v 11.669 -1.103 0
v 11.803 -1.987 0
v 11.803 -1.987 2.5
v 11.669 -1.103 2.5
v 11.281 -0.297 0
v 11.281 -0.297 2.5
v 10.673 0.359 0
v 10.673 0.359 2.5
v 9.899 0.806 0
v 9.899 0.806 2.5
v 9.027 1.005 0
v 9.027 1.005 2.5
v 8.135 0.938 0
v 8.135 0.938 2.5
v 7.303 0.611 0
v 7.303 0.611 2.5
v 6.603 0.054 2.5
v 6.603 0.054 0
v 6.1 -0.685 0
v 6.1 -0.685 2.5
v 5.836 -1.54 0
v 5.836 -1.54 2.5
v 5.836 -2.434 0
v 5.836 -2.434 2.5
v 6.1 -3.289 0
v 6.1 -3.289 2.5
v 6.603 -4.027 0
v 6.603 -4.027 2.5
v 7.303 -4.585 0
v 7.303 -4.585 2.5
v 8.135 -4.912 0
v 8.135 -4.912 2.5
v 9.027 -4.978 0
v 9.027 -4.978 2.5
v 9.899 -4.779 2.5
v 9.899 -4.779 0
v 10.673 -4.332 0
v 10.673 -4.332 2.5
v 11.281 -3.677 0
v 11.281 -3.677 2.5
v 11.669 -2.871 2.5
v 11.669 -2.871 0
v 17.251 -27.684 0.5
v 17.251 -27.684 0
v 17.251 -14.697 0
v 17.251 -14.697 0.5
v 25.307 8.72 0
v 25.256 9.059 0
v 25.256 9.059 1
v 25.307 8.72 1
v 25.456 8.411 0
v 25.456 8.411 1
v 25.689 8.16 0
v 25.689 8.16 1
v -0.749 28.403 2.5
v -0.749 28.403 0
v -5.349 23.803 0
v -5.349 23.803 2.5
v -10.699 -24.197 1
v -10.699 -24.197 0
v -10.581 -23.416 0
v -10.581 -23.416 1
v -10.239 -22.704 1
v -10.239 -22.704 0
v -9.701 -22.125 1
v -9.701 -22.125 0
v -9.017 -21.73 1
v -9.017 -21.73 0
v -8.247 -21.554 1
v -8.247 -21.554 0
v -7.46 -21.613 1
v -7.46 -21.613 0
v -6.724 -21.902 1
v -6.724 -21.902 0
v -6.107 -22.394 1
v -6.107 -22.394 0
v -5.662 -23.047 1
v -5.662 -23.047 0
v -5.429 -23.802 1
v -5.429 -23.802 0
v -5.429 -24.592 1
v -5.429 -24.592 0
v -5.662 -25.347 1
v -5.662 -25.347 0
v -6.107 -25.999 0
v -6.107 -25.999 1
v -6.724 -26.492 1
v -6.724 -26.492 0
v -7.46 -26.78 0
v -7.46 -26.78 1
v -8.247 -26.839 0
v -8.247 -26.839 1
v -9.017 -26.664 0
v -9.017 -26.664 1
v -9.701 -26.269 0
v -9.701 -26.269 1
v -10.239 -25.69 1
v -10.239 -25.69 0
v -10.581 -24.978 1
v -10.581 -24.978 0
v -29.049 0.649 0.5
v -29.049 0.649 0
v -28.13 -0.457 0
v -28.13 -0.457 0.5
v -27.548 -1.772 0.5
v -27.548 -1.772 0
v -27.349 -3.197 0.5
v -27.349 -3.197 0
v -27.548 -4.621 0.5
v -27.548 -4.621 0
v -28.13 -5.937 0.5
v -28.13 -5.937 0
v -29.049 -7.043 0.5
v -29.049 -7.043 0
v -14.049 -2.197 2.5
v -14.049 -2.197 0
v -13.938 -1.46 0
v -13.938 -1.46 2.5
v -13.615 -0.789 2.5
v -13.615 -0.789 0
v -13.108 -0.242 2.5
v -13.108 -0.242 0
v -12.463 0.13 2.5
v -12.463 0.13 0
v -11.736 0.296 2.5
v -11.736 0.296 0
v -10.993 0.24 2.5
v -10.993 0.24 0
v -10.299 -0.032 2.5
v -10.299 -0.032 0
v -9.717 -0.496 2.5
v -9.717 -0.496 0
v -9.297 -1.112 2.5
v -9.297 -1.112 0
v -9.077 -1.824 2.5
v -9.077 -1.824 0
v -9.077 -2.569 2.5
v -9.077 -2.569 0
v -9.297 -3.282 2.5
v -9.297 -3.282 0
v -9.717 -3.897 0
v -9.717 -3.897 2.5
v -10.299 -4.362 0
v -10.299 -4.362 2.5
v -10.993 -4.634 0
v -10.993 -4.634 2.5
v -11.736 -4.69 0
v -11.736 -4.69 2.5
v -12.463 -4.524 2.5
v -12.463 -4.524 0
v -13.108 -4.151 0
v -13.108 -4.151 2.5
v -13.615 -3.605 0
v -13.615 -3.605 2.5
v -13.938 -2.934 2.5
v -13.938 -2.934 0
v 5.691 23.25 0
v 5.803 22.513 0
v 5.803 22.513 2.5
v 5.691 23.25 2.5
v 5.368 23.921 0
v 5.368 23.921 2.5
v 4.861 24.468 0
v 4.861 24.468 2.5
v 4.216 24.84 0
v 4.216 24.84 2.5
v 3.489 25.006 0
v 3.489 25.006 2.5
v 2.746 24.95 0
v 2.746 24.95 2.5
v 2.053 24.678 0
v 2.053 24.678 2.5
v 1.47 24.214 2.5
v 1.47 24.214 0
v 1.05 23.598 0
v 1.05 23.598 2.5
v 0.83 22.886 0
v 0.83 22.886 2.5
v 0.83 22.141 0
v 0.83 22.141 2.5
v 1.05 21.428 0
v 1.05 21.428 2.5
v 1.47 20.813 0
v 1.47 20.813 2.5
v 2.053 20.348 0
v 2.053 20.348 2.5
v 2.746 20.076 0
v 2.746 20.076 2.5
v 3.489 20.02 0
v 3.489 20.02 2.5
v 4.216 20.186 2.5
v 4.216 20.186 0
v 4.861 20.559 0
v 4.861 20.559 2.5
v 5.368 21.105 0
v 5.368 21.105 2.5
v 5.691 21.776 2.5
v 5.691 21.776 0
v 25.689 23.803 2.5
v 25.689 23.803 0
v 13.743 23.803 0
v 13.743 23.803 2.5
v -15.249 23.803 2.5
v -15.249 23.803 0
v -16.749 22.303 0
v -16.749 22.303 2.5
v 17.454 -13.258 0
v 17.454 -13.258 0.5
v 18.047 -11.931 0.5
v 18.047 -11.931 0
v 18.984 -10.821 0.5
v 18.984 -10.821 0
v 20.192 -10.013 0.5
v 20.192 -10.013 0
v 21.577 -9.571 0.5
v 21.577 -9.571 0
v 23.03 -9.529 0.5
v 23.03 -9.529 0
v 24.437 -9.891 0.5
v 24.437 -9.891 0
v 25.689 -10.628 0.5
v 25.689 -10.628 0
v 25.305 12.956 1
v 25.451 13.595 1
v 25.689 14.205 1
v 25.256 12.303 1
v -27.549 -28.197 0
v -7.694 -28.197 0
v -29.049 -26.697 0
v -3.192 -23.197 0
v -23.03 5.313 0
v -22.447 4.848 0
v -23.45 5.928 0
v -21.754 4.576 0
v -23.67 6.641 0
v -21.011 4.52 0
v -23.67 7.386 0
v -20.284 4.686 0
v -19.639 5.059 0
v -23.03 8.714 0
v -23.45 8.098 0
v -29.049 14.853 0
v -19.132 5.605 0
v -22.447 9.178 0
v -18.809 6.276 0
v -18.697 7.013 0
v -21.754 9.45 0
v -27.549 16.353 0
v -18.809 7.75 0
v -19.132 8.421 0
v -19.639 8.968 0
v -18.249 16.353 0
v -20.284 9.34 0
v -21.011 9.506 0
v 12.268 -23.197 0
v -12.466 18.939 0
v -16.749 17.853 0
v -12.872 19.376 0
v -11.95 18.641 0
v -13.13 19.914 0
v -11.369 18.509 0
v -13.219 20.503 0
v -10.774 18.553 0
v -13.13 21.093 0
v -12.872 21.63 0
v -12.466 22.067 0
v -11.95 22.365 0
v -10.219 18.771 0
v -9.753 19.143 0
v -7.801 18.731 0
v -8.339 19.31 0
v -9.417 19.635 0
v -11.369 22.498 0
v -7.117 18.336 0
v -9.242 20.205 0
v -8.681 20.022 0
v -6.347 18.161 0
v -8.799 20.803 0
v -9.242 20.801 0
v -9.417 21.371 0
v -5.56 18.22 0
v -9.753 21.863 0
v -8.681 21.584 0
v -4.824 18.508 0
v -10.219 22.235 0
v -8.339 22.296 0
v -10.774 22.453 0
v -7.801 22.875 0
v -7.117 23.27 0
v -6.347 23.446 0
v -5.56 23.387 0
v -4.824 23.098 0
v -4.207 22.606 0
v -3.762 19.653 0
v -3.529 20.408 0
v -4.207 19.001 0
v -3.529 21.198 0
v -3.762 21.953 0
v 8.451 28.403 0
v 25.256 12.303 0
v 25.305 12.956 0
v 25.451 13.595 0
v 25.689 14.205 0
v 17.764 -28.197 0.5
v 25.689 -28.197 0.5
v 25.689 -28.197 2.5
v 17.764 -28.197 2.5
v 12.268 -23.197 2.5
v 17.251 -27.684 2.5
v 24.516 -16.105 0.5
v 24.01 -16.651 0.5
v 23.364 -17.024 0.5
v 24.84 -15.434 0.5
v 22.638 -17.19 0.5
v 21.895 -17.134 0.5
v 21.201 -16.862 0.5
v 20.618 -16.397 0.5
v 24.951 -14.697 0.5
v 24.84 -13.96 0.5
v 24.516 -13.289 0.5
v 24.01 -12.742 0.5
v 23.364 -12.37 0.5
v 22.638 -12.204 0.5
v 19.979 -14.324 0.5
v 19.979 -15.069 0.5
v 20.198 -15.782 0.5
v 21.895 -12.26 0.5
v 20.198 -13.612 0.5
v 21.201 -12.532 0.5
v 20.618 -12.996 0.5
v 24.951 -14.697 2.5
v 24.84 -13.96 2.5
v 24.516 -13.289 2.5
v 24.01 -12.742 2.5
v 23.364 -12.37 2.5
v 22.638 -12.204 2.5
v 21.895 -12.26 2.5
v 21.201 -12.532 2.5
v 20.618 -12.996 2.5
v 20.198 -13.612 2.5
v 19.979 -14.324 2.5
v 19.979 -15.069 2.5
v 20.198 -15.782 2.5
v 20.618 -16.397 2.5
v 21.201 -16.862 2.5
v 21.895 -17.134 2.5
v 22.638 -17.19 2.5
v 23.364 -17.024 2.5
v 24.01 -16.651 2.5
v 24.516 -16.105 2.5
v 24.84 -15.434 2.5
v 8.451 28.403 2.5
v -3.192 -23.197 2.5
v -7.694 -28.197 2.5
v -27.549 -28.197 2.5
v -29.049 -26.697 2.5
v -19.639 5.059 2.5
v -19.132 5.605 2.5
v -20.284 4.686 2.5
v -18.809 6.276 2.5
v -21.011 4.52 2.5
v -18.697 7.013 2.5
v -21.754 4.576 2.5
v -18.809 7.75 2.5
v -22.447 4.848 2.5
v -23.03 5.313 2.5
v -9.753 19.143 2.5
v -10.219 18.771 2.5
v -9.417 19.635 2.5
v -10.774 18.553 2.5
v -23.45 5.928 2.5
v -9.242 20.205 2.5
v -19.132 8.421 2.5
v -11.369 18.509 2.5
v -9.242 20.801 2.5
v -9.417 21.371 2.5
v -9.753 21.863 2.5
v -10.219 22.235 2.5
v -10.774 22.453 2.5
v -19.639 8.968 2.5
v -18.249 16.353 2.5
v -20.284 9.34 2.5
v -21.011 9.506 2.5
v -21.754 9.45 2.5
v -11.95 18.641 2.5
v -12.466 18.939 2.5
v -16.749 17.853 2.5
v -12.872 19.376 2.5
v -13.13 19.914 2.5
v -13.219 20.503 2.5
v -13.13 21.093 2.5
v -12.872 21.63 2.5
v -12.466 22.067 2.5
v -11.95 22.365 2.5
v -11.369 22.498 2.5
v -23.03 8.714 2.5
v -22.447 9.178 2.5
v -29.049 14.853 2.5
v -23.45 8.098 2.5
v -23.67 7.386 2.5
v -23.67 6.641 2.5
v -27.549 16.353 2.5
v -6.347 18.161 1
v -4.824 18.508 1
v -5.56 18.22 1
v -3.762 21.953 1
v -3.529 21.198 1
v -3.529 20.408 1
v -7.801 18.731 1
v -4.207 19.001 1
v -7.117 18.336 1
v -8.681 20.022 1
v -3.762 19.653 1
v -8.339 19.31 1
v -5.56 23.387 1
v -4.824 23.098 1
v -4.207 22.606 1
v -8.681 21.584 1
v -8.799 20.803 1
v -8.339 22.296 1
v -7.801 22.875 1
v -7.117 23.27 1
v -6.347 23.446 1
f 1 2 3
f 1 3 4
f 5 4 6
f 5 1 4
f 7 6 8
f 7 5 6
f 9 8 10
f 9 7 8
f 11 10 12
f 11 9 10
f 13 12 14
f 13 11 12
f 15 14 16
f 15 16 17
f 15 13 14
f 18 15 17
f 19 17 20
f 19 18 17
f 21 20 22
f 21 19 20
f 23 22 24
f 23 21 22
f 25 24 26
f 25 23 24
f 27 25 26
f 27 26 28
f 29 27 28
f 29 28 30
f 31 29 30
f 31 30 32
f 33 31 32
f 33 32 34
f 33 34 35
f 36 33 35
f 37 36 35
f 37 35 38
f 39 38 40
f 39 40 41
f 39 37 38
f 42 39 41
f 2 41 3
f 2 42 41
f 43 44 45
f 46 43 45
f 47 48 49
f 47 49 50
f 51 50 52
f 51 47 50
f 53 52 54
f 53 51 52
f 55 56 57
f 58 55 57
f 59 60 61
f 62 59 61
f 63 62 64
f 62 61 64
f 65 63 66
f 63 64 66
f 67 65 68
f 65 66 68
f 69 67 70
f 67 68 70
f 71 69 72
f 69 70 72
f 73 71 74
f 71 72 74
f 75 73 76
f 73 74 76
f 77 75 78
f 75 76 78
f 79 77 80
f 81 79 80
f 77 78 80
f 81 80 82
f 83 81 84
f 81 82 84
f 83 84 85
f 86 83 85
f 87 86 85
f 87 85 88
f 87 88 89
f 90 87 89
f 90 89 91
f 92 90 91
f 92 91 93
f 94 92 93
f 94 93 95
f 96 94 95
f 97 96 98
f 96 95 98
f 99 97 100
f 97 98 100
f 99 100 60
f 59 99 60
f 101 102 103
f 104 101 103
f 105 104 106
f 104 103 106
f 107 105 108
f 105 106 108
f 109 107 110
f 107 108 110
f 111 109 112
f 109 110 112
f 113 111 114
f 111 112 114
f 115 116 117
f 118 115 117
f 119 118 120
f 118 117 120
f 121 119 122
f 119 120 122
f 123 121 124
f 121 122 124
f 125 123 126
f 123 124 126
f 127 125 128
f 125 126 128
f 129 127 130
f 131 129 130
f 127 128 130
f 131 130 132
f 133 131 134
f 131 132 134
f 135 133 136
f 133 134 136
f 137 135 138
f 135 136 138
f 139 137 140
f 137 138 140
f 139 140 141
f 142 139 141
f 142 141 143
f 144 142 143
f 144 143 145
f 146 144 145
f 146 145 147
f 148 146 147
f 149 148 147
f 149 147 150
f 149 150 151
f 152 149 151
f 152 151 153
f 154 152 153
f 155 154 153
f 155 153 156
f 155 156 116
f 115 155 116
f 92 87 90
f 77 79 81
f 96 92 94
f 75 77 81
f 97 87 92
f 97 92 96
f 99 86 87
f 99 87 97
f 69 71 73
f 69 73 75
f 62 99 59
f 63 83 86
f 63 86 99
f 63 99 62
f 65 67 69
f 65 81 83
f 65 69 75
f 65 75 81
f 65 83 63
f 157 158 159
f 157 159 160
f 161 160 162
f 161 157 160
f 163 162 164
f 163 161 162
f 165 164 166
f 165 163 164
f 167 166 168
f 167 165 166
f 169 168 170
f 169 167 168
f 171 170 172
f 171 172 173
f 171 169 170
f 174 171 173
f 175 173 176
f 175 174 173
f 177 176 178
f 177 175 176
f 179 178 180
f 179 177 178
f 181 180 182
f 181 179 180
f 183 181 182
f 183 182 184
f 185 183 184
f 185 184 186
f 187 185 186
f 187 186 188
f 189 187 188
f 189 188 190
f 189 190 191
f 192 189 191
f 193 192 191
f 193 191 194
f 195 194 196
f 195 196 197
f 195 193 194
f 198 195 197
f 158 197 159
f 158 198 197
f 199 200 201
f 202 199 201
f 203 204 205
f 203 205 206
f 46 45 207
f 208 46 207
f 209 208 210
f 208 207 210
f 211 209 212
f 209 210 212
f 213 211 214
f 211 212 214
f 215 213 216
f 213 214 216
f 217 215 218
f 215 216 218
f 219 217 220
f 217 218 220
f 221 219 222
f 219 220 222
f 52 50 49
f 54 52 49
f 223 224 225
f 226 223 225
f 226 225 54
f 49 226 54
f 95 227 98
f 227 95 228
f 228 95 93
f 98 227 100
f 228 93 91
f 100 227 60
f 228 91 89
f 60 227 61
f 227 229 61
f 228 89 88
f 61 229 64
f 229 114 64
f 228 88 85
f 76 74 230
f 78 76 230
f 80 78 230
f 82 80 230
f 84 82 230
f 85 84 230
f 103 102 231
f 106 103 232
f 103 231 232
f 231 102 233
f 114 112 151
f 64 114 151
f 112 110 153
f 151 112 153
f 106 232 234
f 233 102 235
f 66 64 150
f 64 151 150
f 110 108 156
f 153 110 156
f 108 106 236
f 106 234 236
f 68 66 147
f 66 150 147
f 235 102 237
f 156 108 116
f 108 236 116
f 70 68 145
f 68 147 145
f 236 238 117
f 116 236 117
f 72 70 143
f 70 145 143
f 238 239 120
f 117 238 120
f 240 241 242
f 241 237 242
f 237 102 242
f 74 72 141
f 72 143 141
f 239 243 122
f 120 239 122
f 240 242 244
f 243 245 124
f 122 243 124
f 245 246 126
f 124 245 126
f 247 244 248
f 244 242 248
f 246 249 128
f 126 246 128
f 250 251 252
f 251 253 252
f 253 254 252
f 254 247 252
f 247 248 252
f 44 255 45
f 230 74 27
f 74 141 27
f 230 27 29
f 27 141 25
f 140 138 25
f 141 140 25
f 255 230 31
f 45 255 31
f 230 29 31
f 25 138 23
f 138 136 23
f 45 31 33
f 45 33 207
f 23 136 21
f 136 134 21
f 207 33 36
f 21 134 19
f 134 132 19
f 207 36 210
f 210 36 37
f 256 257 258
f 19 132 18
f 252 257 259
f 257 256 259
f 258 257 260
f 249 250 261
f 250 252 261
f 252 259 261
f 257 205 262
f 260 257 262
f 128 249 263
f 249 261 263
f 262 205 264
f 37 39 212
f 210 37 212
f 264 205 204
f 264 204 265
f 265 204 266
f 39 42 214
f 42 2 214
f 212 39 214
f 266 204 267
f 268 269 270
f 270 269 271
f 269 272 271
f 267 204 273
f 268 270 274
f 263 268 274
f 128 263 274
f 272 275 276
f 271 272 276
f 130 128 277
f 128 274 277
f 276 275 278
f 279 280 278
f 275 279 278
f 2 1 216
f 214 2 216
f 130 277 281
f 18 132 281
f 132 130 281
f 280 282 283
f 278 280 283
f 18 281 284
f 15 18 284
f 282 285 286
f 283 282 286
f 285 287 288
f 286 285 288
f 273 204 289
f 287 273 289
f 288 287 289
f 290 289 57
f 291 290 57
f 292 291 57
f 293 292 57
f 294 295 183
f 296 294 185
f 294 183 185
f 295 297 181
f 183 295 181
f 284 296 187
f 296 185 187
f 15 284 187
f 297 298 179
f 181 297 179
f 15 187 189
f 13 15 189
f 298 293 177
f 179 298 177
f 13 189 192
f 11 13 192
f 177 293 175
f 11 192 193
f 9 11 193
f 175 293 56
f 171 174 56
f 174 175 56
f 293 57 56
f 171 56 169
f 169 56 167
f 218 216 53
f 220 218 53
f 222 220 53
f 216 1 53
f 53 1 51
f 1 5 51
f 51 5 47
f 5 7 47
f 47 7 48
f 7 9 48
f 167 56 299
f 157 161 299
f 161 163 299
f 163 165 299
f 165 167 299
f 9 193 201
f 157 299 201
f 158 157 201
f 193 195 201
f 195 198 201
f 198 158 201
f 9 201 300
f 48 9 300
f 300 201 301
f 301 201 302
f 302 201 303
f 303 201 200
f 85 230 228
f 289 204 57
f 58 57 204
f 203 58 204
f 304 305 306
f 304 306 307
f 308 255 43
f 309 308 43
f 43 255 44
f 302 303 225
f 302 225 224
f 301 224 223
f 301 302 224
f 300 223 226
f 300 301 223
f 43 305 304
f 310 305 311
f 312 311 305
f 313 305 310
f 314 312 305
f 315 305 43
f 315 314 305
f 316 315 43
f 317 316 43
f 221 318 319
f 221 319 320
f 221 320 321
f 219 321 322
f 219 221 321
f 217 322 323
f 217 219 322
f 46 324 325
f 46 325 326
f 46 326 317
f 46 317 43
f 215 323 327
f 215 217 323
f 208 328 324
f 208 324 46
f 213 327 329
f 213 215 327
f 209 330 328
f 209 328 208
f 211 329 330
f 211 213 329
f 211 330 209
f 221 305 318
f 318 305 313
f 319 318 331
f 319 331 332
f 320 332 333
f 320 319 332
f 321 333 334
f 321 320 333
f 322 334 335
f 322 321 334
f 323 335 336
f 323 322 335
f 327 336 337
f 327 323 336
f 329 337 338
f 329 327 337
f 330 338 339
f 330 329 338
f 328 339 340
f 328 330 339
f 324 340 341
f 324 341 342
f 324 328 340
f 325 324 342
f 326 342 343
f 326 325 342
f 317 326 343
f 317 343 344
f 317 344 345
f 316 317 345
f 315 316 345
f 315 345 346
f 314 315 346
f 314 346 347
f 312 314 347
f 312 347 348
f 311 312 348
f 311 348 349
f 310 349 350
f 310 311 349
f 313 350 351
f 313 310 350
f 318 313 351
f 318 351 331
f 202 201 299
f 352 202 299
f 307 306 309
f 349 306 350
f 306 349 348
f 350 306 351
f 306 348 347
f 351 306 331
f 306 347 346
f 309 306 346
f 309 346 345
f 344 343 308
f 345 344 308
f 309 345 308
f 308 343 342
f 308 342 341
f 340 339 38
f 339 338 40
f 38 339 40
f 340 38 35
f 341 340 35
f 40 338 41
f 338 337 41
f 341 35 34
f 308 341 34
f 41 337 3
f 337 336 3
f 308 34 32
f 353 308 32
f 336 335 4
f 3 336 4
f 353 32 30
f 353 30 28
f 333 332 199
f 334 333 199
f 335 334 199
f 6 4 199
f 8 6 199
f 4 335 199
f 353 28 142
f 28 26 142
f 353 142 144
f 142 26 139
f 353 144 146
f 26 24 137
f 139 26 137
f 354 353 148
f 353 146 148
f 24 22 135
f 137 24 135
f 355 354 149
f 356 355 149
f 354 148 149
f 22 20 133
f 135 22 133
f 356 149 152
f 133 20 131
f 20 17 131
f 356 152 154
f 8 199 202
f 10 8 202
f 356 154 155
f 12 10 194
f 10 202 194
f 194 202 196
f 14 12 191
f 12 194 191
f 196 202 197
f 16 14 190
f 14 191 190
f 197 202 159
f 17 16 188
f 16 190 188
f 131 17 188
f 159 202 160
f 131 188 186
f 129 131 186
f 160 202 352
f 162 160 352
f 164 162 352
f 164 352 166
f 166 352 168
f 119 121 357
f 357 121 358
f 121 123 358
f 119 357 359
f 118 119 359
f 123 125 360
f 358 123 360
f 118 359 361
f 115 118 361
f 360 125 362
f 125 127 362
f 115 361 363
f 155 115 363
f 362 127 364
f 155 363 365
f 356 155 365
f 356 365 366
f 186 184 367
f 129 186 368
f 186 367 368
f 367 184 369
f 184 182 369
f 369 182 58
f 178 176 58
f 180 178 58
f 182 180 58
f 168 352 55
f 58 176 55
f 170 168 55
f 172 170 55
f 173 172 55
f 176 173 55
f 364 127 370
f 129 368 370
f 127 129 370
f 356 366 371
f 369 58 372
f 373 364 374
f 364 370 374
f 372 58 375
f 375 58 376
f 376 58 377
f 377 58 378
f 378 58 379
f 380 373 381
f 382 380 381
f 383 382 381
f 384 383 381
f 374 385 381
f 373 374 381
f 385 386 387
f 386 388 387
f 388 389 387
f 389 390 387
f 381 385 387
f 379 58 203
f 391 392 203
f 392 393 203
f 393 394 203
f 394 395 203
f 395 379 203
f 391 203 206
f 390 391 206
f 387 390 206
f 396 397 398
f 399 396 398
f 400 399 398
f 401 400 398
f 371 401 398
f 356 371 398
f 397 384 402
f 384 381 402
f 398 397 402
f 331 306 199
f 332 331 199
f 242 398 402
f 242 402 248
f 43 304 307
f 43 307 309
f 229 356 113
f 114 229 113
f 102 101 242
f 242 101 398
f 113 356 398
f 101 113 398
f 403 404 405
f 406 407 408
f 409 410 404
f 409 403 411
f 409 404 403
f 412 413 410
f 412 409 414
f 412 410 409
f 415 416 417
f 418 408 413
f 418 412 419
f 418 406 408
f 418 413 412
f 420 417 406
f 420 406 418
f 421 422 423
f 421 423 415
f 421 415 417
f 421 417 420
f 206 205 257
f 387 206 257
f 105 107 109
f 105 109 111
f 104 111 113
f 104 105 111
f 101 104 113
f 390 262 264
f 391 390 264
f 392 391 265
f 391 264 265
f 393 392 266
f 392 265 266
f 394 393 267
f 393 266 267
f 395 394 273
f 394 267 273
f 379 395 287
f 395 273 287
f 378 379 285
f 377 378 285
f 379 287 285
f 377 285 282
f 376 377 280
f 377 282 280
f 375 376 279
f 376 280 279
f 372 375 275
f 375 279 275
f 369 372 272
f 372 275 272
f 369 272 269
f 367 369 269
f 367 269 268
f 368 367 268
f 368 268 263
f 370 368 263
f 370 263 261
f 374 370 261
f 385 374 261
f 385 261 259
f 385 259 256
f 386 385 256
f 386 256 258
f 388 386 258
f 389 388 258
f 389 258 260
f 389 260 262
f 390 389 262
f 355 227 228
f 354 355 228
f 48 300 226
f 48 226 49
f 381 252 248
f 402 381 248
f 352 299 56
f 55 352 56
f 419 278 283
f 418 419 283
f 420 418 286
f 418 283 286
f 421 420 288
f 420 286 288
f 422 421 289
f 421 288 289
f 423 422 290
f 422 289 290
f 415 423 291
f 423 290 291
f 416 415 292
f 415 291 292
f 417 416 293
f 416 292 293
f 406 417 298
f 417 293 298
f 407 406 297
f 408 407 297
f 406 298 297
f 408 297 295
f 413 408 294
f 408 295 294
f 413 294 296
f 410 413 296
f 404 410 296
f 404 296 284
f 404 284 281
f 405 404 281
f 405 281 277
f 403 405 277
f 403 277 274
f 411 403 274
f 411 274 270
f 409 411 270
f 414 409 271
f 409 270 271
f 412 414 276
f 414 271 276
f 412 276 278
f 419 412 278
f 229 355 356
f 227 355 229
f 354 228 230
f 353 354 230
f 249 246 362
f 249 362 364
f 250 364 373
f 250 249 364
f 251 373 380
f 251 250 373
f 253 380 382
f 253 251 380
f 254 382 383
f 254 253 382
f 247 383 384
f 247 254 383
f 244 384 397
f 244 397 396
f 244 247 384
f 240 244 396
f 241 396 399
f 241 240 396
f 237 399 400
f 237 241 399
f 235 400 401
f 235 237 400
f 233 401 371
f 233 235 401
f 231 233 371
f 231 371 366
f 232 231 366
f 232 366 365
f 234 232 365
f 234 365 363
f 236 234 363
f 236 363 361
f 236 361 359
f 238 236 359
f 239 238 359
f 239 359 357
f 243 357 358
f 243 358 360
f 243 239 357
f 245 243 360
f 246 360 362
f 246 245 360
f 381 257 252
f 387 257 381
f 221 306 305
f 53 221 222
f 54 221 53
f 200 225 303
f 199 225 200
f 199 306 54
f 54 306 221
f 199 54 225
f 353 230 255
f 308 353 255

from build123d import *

# Parameters (mm, degrees)
SKETCH_1_R          = 3
SKETCH_1_R_2        = 2.5
EXTRUDE_1_DEPTH     = 2.5
EXTRUDE_START       = -2
SKETCH_3_R          = 2.5
EXTRUDE_3_DEPTH     = 2
SKETCH_7_R          = 2.65
CUT_EXTRUDE_1_DEPTH = 1
CHAMFER_1_SIZE      = 1
CUT_EXTRUDE_3_REACH = 53.597
SKETCH_10_R         = 2.5
CUT_EXTRUDE_4_REACH = 53.635
CHAMFER_2_SIZE      = 1.5
CUT_EXTRUDE_5_REACH = 53.635
CHAMFER_3_SIZE      = 2
CUT_EXTRUDE_6_REACH = 49.547
SKETCH_15_W         = 9
SKETCH_15_H         = 44.55
SKETCH_15_H_2       = 52
CUT_EXTRUDE_7_REACH = 42.704
SKETCH_16_R         = 2.5
CHAMFER_4_SIZE      = 1.5
SKETCH_17_R         = 2
CUT_EXTRUDE_8_DEPTH = 10


with BuildPart() as part:
    # 스케치1 → 보스-돌출1 (new body)
    with BuildSketch(Plane.XY):
        with BuildLine():
            Line((-27.349187557, -28.196867314), (-7.694270353, -28.196867314))
            Line((-7.694270353, -28.196867314), (-3.192250131, -23.196867314))
            Line((-3.192250131, -23.196867314), (12.267749869, -23.196867314))
            Line((12.267749869, -23.196867314), (17.250812443, -27.683637009))
            Line((17.250812443, -27.683637009), (17.250812443, -14.696867314))
            ThreePointArc((17.250812443, -14.696867314), (22.450812443, -9.496867314), (27.650812443, -14.696867314))
            Line((27.650812443, -14.696867314), (27.650812443, -28.196867314))
            Line((27.650812443, -28.196867314), (40.650812443, -28.196867314))
            Line((40.650812443, -28.196867314), (40.650812443, 12.183132686))
            Line((40.650812443, 12.183132686), (28.992507116, 23.803132686))
            Line((28.992507116, 23.803132686), (13.742507116, 23.803132686))
            Line((13.742507116, 23.803132686), (8.450812443, 28.403132686))
            Line((8.450812443, 28.403132686), (-0.749187557, 28.403132686))
            Line((-0.749187557, 28.403132686), (-5.349187557, 23.803132686))
            Line((-5.349187557, 23.803132686), (-28.149187557, 23.803132686))
            Line((-28.149187557, 23.803132686), (-43.049187557, 8.903132686))
            Line((-43.049187557, 8.903132686), (-43.049187557, -28.196867314))
            Line((-43.049187557, -28.196867314), (-37.749187557, -28.196867314))
            Line((-37.749187557, -28.196867314), (-37.749187557, -3.196867314))
            ThreePointArc((-37.749187557, -3.196867314), (-29.949187557, 1.306464785), (-29.949187557, -7.700199414))
            Line((-29.949187557, -7.700199414), (-29.949187557, -28.196867314))
            Line((-29.949187557, -28.196867314), (-27.349187557, -28.196867314))
        make_face()
        with Locations((8.802507116, -1.986867314)):
            Circle(SKETCH_1_R, mode=Mode.SUBTRACT)
        with Locations((-21.197492884, 7.013132686)):
            Circle(SKETCH_1_R_2, mode=Mode.SUBTRACT)
        with Locations((3.302507116, 22.513132686)):
            Circle(SKETCH_1_R_2, mode=Mode.SUBTRACT)
    extrude(amount=EXTRUDE_1_DEPTH)

    # 스케치3 → 보스-돌출3 (add)
    # profile 1 of 2: a face of its own
    with BuildSketch(Plane.XY.offset(2.5).offset(EXTRUDE_START)):
        with BuildLine():
            Line((27.650812443, -14.696867314), (27.650812443, -28.196867314))
            Line((27.650812443, -28.196867314), (17.764042748, -28.196867314))
            Line((17.764042748, -28.196867314), (17.250812443, -27.683637009))
            Line((17.250812443, -27.683637009), (17.250812443, -14.696867314))
            ThreePointArc((17.250812443, -14.696867314), (22.450812443, -9.496867314), (27.650812443, -14.696867314))
        make_face()
        with Locations((22.450812443, -14.696867314)):
            Circle(SKETCH_3_R, mode=Mode.SUBTRACT)
    # profile 2 of 2: a face of its own
    with BuildSketch(Plane.XY.offset(2.5).offset(EXTRUDE_START)):
        with BuildLine():
            Line((-29.949187557, -7.700199414), (-29.949187557, -28.196867314))
            Line((-29.949187557, -28.196867314), (-30.049187557, -28.196867314))
            Line((-30.049187557, -28.196867314), (-37.749187557, -28.196867314))
            Line((-37.749187557, -28.196867314), (-37.749187557, -3.196867314))
            ThreePointArc((-37.749187557, -3.196867314), (-29.949187557, 1.306464785), (-29.949187557, -7.700199414))
        make_face()
        with Locations((-32.549187557, -3.196867314)):
            Circle(SKETCH_3_R, mode=Mode.SUBTRACT)
    extrude(amount=EXTRUDE_3_DEPTH)

    # 스케치7 → 컷-돌출1 (cut)
    with BuildSketch(Plane(origin=(0, 0, 0), x_dir=(-1, 0, 0), z_dir=(0, 0, -1))):
        with Locations((6.149187557, 20.803132686)):
            Circle(SKETCH_7_R)
        with Locations((8.049187557, -24.196867314)):
            Circle(SKETCH_7_R)
        with BuildLine():
            Line((-26.406412787, 7.908733029), (-32.895212099, 7.908733029))
            ThreePointArc((-32.895212099, 7.908733029), (-33.708384897, 8.245560231), (-34.045212099, 9.058733029))
            Line((-34.045212099, 9.058733029), (-34.045212099, 15.547532342))
            ThreePointArc((-34.045212099, 15.547532342), (-33.708384897, 16.36070514), (-32.895212099, 16.697532342))
            Line((-32.895212099, 16.697532342), (-29.650812443, 16.697532342))
            ThreePointArc((-29.650812443, 16.697532342), (-26.543502647, 15.410442482), (-25.256412787, 12.303132686))
            Line((-25.256412787, 12.303132686), (-25.256412787, 9.058733029))
            ThreePointArc((-25.256412787, 9.058733029), (-25.593239988, 8.245560231), (-26.406412787, 7.908733029))
        make_face()
    extrude(amount=-CUT_EXTRUDE_1_DEPTH, mode=Mode.SUBTRACT)

    # 모따기1
    chamfer_1_edges = [part.edges().sort_by_distance(p)[0] for p in [
        (-43.049187557, -28.196867314, 1.25),
        (40.650812443, -28.196867314, 1.25),
    ]]
    chamfer(chamfer_1_edges, length=CHAMFER_1_SIZE)

    # 스케치10 → 컷-돌출3 (cut, up to next)
    with BuildSketch(Plane(origin=(0, 0, 1), x_dir=(-1, 0, 0), z_dir=(0, 0, -1)), mode=Mode.PRIVATE) as cut_extrude_3_sk1:
        with Locations((-29.650812443, 12.303132686)):
            Circle(SKETCH_10_R)
    cut_extrude_3_tool1 = extrude(cut_extrude_3_sk1.sketch, amount=-CUT_EXTRUDE_3_REACH, mode=Mode.PRIVATE) & part.part
    add(cut_extrude_3_tool1.solids().sort_by_distance((29.650812, 12.303133, 1))[0], mode=Mode.SUBTRACT)

    # 스케치12 → 컷-돌출4 (cut, up to next)
    with BuildSketch(Plane(origin=(0, 0, 0), x_dir=(-1, 0, 0), z_dir=(0, 0, -1)), mode=Mode.PRIVATE) as cut_extrude_4_sk1:
        Polygon((16.749187557, 23.803132686), (16.749187557, 16.353132686), (35.599187557, 16.353132686), (28.149187557, 23.803132686), align=None)
    cut_extrude_4_tool1 = extrude(cut_extrude_4_sk1.sketch, amount=-CUT_EXTRUDE_4_REACH, mode=Mode.PRIVATE) & part.part
    add(cut_extrude_4_tool1.solids().sort_by_distance((-24.464587, 19.772334, 0))[0], mode=Mode.SUBTRACT)

    # 모따기2
    chamfer_2_edges = [part.edges().sort_by_distance(p)[0] for p in [
        (-16.749187557, 23.803132686, 1.25),
        (-16.749187557, 16.353132686, 1.25),
    ]]
    chamfer(chamfer_2_edges, length=CHAMFER_2_SIZE)

    # 스케치13 → 컷-돌출5 (cut, up to next)
    with BuildSketch(Plane(origin=(0, 0, 0), x_dir=(-1, 0, 0), z_dir=(0, 0, -1)), mode=Mode.PRIVATE) as cut_extrude_5_sk1:
        Polygon((-34.689283113, 18.125074406), (-34.689283113, -28.196867314), (-39.650812443, -28.196867314), (-40.650812443, -27.196867314), (-40.650812443, 12.183132686), align=None)
    cut_extrude_5_tool1 = extrude(cut_extrude_5_sk1.sketch, amount=-CUT_EXTRUDE_5_REACH, mode=Mode.PRIVATE) & part.part
    # 스케치13 → 컷-돌출5 (cut, up to next)
    with BuildSketch(Plane(origin=(0, 0, 0), x_dir=(-1, 0, 0), z_dir=(0, 0, -1)), mode=Mode.PRIVATE) as cut_extrude_5_sk2:
        Polygon((38.049187557, 13.903132686), (43.049187557, 8.903132686), (43.049187557, -27.196867314), (42.049187557, -28.196867314), (38.049187557, -28.196867314), align=None)
    cut_extrude_5_tool2 = extrude(cut_extrude_5_sk2.sketch, amount=-CUT_EXTRUDE_5_REACH, mode=Mode.PRIVATE) & part.part
    add(cut_extrude_5_tool1.solids().sort_by_distance((37.59669, -6.446011, 0))[0], mode=Mode.SUBTRACT)
    add(cut_extrude_5_tool2.solids().sort_by_distance((-40.49096, -8.321213, 0))[0], mode=Mode.SUBTRACT)

    # 모따기3
    chamfer_3_edges = [part.edges().sort_by_distance(p)[0] for p in [
        (-38.049187557, -28.196867314, 1.25),
        (34.689283113, -28.196867314, 1.25),
    ]]
    chamfer(chamfer_3_edges, length=CHAMFER_3_SIZE)

    # 스케치15 → 컷-돌출6 (cut, up to next)
    with BuildSketch(Plane.XY.offset(2.5), mode=Mode.PRIVATE) as cut_extrude_6_sk1:
        with Locations((-33.549187557, -5.921867314)):
            Rectangle(SKETCH_15_W, SKETCH_15_H)
    cut_extrude_6_tool1 = extrude(cut_extrude_6_sk1.sketch, amount=-CUT_EXTRUDE_6_REACH, mode=Mode.PRIVATE) & part.part
    # 스케치15 → 컷-돌출6 (cut, up to next)
    with BuildSketch(Plane.XY.offset(2.5), mode=Mode.PRIVATE) as cut_extrude_6_sk2:
        with Locations((30.189283113, -2.196867314)):
            Rectangle(SKETCH_15_W, SKETCH_15_H_2)
    cut_extrude_6_tool2 = extrude(cut_extrude_6_sk2.sketch, amount=-CUT_EXTRUDE_6_REACH, mode=Mode.PRIVATE) & part.part
    add(cut_extrude_6_tool1.solids().sort_by_distance((-33.549188, -5.921867, 2.5))[0], mode=Mode.SUBTRACT)
    add(cut_extrude_6_tool2.solids().sort_by_distance((30.189283, -2.196867, 2.5))[0], mode=Mode.SUBTRACT)

    # 스케치16 → 컷-돌출7 (cut, up to next)
    with BuildSketch(Plane(origin=(0, 0, 0), x_dir=(-1, 0, 0), z_dir=(0, 0, -1)), mode=Mode.PRIVATE) as cut_extrude_7_sk1:
        with Locations((11.549187557, -2.196867314)):
            Circle(SKETCH_16_R)
    cut_extrude_7_tool1 = extrude(cut_extrude_7_sk1.sketch, amount=-CUT_EXTRUDE_7_REACH, mode=Mode.PRIVATE) & part.part
    add(cut_extrude_7_tool1.solids().sort_by_distance((-11.549188, -2.196867, 0))[0], mode=Mode.SUBTRACT)

    # 모따기4
    chamfer_4_edges = [part.edges().sort_by_distance(p)[0] for p in [
        (-29.049187557, 16.353132686, 1.25),
        (-29.049187557, -28.196867314, 1.25),
    ]]
    chamfer(chamfer_4_edges, length=CHAMFER_4_SIZE)

    # 스케치17 → 컷-돌출8 (cut)
    with BuildSketch(Plane(origin=(0, 0, 0), x_dir=(-1, 0, 0), z_dir=(0, 0, -1))):
        with Locations((11.219187557, 20.503132686)):
            Circle(SKETCH_17_R)
    extrude(amount=-CUT_EXTRUDE_8_DEPTH, mode=Mode.SUBTRACT)


solid = part.part
